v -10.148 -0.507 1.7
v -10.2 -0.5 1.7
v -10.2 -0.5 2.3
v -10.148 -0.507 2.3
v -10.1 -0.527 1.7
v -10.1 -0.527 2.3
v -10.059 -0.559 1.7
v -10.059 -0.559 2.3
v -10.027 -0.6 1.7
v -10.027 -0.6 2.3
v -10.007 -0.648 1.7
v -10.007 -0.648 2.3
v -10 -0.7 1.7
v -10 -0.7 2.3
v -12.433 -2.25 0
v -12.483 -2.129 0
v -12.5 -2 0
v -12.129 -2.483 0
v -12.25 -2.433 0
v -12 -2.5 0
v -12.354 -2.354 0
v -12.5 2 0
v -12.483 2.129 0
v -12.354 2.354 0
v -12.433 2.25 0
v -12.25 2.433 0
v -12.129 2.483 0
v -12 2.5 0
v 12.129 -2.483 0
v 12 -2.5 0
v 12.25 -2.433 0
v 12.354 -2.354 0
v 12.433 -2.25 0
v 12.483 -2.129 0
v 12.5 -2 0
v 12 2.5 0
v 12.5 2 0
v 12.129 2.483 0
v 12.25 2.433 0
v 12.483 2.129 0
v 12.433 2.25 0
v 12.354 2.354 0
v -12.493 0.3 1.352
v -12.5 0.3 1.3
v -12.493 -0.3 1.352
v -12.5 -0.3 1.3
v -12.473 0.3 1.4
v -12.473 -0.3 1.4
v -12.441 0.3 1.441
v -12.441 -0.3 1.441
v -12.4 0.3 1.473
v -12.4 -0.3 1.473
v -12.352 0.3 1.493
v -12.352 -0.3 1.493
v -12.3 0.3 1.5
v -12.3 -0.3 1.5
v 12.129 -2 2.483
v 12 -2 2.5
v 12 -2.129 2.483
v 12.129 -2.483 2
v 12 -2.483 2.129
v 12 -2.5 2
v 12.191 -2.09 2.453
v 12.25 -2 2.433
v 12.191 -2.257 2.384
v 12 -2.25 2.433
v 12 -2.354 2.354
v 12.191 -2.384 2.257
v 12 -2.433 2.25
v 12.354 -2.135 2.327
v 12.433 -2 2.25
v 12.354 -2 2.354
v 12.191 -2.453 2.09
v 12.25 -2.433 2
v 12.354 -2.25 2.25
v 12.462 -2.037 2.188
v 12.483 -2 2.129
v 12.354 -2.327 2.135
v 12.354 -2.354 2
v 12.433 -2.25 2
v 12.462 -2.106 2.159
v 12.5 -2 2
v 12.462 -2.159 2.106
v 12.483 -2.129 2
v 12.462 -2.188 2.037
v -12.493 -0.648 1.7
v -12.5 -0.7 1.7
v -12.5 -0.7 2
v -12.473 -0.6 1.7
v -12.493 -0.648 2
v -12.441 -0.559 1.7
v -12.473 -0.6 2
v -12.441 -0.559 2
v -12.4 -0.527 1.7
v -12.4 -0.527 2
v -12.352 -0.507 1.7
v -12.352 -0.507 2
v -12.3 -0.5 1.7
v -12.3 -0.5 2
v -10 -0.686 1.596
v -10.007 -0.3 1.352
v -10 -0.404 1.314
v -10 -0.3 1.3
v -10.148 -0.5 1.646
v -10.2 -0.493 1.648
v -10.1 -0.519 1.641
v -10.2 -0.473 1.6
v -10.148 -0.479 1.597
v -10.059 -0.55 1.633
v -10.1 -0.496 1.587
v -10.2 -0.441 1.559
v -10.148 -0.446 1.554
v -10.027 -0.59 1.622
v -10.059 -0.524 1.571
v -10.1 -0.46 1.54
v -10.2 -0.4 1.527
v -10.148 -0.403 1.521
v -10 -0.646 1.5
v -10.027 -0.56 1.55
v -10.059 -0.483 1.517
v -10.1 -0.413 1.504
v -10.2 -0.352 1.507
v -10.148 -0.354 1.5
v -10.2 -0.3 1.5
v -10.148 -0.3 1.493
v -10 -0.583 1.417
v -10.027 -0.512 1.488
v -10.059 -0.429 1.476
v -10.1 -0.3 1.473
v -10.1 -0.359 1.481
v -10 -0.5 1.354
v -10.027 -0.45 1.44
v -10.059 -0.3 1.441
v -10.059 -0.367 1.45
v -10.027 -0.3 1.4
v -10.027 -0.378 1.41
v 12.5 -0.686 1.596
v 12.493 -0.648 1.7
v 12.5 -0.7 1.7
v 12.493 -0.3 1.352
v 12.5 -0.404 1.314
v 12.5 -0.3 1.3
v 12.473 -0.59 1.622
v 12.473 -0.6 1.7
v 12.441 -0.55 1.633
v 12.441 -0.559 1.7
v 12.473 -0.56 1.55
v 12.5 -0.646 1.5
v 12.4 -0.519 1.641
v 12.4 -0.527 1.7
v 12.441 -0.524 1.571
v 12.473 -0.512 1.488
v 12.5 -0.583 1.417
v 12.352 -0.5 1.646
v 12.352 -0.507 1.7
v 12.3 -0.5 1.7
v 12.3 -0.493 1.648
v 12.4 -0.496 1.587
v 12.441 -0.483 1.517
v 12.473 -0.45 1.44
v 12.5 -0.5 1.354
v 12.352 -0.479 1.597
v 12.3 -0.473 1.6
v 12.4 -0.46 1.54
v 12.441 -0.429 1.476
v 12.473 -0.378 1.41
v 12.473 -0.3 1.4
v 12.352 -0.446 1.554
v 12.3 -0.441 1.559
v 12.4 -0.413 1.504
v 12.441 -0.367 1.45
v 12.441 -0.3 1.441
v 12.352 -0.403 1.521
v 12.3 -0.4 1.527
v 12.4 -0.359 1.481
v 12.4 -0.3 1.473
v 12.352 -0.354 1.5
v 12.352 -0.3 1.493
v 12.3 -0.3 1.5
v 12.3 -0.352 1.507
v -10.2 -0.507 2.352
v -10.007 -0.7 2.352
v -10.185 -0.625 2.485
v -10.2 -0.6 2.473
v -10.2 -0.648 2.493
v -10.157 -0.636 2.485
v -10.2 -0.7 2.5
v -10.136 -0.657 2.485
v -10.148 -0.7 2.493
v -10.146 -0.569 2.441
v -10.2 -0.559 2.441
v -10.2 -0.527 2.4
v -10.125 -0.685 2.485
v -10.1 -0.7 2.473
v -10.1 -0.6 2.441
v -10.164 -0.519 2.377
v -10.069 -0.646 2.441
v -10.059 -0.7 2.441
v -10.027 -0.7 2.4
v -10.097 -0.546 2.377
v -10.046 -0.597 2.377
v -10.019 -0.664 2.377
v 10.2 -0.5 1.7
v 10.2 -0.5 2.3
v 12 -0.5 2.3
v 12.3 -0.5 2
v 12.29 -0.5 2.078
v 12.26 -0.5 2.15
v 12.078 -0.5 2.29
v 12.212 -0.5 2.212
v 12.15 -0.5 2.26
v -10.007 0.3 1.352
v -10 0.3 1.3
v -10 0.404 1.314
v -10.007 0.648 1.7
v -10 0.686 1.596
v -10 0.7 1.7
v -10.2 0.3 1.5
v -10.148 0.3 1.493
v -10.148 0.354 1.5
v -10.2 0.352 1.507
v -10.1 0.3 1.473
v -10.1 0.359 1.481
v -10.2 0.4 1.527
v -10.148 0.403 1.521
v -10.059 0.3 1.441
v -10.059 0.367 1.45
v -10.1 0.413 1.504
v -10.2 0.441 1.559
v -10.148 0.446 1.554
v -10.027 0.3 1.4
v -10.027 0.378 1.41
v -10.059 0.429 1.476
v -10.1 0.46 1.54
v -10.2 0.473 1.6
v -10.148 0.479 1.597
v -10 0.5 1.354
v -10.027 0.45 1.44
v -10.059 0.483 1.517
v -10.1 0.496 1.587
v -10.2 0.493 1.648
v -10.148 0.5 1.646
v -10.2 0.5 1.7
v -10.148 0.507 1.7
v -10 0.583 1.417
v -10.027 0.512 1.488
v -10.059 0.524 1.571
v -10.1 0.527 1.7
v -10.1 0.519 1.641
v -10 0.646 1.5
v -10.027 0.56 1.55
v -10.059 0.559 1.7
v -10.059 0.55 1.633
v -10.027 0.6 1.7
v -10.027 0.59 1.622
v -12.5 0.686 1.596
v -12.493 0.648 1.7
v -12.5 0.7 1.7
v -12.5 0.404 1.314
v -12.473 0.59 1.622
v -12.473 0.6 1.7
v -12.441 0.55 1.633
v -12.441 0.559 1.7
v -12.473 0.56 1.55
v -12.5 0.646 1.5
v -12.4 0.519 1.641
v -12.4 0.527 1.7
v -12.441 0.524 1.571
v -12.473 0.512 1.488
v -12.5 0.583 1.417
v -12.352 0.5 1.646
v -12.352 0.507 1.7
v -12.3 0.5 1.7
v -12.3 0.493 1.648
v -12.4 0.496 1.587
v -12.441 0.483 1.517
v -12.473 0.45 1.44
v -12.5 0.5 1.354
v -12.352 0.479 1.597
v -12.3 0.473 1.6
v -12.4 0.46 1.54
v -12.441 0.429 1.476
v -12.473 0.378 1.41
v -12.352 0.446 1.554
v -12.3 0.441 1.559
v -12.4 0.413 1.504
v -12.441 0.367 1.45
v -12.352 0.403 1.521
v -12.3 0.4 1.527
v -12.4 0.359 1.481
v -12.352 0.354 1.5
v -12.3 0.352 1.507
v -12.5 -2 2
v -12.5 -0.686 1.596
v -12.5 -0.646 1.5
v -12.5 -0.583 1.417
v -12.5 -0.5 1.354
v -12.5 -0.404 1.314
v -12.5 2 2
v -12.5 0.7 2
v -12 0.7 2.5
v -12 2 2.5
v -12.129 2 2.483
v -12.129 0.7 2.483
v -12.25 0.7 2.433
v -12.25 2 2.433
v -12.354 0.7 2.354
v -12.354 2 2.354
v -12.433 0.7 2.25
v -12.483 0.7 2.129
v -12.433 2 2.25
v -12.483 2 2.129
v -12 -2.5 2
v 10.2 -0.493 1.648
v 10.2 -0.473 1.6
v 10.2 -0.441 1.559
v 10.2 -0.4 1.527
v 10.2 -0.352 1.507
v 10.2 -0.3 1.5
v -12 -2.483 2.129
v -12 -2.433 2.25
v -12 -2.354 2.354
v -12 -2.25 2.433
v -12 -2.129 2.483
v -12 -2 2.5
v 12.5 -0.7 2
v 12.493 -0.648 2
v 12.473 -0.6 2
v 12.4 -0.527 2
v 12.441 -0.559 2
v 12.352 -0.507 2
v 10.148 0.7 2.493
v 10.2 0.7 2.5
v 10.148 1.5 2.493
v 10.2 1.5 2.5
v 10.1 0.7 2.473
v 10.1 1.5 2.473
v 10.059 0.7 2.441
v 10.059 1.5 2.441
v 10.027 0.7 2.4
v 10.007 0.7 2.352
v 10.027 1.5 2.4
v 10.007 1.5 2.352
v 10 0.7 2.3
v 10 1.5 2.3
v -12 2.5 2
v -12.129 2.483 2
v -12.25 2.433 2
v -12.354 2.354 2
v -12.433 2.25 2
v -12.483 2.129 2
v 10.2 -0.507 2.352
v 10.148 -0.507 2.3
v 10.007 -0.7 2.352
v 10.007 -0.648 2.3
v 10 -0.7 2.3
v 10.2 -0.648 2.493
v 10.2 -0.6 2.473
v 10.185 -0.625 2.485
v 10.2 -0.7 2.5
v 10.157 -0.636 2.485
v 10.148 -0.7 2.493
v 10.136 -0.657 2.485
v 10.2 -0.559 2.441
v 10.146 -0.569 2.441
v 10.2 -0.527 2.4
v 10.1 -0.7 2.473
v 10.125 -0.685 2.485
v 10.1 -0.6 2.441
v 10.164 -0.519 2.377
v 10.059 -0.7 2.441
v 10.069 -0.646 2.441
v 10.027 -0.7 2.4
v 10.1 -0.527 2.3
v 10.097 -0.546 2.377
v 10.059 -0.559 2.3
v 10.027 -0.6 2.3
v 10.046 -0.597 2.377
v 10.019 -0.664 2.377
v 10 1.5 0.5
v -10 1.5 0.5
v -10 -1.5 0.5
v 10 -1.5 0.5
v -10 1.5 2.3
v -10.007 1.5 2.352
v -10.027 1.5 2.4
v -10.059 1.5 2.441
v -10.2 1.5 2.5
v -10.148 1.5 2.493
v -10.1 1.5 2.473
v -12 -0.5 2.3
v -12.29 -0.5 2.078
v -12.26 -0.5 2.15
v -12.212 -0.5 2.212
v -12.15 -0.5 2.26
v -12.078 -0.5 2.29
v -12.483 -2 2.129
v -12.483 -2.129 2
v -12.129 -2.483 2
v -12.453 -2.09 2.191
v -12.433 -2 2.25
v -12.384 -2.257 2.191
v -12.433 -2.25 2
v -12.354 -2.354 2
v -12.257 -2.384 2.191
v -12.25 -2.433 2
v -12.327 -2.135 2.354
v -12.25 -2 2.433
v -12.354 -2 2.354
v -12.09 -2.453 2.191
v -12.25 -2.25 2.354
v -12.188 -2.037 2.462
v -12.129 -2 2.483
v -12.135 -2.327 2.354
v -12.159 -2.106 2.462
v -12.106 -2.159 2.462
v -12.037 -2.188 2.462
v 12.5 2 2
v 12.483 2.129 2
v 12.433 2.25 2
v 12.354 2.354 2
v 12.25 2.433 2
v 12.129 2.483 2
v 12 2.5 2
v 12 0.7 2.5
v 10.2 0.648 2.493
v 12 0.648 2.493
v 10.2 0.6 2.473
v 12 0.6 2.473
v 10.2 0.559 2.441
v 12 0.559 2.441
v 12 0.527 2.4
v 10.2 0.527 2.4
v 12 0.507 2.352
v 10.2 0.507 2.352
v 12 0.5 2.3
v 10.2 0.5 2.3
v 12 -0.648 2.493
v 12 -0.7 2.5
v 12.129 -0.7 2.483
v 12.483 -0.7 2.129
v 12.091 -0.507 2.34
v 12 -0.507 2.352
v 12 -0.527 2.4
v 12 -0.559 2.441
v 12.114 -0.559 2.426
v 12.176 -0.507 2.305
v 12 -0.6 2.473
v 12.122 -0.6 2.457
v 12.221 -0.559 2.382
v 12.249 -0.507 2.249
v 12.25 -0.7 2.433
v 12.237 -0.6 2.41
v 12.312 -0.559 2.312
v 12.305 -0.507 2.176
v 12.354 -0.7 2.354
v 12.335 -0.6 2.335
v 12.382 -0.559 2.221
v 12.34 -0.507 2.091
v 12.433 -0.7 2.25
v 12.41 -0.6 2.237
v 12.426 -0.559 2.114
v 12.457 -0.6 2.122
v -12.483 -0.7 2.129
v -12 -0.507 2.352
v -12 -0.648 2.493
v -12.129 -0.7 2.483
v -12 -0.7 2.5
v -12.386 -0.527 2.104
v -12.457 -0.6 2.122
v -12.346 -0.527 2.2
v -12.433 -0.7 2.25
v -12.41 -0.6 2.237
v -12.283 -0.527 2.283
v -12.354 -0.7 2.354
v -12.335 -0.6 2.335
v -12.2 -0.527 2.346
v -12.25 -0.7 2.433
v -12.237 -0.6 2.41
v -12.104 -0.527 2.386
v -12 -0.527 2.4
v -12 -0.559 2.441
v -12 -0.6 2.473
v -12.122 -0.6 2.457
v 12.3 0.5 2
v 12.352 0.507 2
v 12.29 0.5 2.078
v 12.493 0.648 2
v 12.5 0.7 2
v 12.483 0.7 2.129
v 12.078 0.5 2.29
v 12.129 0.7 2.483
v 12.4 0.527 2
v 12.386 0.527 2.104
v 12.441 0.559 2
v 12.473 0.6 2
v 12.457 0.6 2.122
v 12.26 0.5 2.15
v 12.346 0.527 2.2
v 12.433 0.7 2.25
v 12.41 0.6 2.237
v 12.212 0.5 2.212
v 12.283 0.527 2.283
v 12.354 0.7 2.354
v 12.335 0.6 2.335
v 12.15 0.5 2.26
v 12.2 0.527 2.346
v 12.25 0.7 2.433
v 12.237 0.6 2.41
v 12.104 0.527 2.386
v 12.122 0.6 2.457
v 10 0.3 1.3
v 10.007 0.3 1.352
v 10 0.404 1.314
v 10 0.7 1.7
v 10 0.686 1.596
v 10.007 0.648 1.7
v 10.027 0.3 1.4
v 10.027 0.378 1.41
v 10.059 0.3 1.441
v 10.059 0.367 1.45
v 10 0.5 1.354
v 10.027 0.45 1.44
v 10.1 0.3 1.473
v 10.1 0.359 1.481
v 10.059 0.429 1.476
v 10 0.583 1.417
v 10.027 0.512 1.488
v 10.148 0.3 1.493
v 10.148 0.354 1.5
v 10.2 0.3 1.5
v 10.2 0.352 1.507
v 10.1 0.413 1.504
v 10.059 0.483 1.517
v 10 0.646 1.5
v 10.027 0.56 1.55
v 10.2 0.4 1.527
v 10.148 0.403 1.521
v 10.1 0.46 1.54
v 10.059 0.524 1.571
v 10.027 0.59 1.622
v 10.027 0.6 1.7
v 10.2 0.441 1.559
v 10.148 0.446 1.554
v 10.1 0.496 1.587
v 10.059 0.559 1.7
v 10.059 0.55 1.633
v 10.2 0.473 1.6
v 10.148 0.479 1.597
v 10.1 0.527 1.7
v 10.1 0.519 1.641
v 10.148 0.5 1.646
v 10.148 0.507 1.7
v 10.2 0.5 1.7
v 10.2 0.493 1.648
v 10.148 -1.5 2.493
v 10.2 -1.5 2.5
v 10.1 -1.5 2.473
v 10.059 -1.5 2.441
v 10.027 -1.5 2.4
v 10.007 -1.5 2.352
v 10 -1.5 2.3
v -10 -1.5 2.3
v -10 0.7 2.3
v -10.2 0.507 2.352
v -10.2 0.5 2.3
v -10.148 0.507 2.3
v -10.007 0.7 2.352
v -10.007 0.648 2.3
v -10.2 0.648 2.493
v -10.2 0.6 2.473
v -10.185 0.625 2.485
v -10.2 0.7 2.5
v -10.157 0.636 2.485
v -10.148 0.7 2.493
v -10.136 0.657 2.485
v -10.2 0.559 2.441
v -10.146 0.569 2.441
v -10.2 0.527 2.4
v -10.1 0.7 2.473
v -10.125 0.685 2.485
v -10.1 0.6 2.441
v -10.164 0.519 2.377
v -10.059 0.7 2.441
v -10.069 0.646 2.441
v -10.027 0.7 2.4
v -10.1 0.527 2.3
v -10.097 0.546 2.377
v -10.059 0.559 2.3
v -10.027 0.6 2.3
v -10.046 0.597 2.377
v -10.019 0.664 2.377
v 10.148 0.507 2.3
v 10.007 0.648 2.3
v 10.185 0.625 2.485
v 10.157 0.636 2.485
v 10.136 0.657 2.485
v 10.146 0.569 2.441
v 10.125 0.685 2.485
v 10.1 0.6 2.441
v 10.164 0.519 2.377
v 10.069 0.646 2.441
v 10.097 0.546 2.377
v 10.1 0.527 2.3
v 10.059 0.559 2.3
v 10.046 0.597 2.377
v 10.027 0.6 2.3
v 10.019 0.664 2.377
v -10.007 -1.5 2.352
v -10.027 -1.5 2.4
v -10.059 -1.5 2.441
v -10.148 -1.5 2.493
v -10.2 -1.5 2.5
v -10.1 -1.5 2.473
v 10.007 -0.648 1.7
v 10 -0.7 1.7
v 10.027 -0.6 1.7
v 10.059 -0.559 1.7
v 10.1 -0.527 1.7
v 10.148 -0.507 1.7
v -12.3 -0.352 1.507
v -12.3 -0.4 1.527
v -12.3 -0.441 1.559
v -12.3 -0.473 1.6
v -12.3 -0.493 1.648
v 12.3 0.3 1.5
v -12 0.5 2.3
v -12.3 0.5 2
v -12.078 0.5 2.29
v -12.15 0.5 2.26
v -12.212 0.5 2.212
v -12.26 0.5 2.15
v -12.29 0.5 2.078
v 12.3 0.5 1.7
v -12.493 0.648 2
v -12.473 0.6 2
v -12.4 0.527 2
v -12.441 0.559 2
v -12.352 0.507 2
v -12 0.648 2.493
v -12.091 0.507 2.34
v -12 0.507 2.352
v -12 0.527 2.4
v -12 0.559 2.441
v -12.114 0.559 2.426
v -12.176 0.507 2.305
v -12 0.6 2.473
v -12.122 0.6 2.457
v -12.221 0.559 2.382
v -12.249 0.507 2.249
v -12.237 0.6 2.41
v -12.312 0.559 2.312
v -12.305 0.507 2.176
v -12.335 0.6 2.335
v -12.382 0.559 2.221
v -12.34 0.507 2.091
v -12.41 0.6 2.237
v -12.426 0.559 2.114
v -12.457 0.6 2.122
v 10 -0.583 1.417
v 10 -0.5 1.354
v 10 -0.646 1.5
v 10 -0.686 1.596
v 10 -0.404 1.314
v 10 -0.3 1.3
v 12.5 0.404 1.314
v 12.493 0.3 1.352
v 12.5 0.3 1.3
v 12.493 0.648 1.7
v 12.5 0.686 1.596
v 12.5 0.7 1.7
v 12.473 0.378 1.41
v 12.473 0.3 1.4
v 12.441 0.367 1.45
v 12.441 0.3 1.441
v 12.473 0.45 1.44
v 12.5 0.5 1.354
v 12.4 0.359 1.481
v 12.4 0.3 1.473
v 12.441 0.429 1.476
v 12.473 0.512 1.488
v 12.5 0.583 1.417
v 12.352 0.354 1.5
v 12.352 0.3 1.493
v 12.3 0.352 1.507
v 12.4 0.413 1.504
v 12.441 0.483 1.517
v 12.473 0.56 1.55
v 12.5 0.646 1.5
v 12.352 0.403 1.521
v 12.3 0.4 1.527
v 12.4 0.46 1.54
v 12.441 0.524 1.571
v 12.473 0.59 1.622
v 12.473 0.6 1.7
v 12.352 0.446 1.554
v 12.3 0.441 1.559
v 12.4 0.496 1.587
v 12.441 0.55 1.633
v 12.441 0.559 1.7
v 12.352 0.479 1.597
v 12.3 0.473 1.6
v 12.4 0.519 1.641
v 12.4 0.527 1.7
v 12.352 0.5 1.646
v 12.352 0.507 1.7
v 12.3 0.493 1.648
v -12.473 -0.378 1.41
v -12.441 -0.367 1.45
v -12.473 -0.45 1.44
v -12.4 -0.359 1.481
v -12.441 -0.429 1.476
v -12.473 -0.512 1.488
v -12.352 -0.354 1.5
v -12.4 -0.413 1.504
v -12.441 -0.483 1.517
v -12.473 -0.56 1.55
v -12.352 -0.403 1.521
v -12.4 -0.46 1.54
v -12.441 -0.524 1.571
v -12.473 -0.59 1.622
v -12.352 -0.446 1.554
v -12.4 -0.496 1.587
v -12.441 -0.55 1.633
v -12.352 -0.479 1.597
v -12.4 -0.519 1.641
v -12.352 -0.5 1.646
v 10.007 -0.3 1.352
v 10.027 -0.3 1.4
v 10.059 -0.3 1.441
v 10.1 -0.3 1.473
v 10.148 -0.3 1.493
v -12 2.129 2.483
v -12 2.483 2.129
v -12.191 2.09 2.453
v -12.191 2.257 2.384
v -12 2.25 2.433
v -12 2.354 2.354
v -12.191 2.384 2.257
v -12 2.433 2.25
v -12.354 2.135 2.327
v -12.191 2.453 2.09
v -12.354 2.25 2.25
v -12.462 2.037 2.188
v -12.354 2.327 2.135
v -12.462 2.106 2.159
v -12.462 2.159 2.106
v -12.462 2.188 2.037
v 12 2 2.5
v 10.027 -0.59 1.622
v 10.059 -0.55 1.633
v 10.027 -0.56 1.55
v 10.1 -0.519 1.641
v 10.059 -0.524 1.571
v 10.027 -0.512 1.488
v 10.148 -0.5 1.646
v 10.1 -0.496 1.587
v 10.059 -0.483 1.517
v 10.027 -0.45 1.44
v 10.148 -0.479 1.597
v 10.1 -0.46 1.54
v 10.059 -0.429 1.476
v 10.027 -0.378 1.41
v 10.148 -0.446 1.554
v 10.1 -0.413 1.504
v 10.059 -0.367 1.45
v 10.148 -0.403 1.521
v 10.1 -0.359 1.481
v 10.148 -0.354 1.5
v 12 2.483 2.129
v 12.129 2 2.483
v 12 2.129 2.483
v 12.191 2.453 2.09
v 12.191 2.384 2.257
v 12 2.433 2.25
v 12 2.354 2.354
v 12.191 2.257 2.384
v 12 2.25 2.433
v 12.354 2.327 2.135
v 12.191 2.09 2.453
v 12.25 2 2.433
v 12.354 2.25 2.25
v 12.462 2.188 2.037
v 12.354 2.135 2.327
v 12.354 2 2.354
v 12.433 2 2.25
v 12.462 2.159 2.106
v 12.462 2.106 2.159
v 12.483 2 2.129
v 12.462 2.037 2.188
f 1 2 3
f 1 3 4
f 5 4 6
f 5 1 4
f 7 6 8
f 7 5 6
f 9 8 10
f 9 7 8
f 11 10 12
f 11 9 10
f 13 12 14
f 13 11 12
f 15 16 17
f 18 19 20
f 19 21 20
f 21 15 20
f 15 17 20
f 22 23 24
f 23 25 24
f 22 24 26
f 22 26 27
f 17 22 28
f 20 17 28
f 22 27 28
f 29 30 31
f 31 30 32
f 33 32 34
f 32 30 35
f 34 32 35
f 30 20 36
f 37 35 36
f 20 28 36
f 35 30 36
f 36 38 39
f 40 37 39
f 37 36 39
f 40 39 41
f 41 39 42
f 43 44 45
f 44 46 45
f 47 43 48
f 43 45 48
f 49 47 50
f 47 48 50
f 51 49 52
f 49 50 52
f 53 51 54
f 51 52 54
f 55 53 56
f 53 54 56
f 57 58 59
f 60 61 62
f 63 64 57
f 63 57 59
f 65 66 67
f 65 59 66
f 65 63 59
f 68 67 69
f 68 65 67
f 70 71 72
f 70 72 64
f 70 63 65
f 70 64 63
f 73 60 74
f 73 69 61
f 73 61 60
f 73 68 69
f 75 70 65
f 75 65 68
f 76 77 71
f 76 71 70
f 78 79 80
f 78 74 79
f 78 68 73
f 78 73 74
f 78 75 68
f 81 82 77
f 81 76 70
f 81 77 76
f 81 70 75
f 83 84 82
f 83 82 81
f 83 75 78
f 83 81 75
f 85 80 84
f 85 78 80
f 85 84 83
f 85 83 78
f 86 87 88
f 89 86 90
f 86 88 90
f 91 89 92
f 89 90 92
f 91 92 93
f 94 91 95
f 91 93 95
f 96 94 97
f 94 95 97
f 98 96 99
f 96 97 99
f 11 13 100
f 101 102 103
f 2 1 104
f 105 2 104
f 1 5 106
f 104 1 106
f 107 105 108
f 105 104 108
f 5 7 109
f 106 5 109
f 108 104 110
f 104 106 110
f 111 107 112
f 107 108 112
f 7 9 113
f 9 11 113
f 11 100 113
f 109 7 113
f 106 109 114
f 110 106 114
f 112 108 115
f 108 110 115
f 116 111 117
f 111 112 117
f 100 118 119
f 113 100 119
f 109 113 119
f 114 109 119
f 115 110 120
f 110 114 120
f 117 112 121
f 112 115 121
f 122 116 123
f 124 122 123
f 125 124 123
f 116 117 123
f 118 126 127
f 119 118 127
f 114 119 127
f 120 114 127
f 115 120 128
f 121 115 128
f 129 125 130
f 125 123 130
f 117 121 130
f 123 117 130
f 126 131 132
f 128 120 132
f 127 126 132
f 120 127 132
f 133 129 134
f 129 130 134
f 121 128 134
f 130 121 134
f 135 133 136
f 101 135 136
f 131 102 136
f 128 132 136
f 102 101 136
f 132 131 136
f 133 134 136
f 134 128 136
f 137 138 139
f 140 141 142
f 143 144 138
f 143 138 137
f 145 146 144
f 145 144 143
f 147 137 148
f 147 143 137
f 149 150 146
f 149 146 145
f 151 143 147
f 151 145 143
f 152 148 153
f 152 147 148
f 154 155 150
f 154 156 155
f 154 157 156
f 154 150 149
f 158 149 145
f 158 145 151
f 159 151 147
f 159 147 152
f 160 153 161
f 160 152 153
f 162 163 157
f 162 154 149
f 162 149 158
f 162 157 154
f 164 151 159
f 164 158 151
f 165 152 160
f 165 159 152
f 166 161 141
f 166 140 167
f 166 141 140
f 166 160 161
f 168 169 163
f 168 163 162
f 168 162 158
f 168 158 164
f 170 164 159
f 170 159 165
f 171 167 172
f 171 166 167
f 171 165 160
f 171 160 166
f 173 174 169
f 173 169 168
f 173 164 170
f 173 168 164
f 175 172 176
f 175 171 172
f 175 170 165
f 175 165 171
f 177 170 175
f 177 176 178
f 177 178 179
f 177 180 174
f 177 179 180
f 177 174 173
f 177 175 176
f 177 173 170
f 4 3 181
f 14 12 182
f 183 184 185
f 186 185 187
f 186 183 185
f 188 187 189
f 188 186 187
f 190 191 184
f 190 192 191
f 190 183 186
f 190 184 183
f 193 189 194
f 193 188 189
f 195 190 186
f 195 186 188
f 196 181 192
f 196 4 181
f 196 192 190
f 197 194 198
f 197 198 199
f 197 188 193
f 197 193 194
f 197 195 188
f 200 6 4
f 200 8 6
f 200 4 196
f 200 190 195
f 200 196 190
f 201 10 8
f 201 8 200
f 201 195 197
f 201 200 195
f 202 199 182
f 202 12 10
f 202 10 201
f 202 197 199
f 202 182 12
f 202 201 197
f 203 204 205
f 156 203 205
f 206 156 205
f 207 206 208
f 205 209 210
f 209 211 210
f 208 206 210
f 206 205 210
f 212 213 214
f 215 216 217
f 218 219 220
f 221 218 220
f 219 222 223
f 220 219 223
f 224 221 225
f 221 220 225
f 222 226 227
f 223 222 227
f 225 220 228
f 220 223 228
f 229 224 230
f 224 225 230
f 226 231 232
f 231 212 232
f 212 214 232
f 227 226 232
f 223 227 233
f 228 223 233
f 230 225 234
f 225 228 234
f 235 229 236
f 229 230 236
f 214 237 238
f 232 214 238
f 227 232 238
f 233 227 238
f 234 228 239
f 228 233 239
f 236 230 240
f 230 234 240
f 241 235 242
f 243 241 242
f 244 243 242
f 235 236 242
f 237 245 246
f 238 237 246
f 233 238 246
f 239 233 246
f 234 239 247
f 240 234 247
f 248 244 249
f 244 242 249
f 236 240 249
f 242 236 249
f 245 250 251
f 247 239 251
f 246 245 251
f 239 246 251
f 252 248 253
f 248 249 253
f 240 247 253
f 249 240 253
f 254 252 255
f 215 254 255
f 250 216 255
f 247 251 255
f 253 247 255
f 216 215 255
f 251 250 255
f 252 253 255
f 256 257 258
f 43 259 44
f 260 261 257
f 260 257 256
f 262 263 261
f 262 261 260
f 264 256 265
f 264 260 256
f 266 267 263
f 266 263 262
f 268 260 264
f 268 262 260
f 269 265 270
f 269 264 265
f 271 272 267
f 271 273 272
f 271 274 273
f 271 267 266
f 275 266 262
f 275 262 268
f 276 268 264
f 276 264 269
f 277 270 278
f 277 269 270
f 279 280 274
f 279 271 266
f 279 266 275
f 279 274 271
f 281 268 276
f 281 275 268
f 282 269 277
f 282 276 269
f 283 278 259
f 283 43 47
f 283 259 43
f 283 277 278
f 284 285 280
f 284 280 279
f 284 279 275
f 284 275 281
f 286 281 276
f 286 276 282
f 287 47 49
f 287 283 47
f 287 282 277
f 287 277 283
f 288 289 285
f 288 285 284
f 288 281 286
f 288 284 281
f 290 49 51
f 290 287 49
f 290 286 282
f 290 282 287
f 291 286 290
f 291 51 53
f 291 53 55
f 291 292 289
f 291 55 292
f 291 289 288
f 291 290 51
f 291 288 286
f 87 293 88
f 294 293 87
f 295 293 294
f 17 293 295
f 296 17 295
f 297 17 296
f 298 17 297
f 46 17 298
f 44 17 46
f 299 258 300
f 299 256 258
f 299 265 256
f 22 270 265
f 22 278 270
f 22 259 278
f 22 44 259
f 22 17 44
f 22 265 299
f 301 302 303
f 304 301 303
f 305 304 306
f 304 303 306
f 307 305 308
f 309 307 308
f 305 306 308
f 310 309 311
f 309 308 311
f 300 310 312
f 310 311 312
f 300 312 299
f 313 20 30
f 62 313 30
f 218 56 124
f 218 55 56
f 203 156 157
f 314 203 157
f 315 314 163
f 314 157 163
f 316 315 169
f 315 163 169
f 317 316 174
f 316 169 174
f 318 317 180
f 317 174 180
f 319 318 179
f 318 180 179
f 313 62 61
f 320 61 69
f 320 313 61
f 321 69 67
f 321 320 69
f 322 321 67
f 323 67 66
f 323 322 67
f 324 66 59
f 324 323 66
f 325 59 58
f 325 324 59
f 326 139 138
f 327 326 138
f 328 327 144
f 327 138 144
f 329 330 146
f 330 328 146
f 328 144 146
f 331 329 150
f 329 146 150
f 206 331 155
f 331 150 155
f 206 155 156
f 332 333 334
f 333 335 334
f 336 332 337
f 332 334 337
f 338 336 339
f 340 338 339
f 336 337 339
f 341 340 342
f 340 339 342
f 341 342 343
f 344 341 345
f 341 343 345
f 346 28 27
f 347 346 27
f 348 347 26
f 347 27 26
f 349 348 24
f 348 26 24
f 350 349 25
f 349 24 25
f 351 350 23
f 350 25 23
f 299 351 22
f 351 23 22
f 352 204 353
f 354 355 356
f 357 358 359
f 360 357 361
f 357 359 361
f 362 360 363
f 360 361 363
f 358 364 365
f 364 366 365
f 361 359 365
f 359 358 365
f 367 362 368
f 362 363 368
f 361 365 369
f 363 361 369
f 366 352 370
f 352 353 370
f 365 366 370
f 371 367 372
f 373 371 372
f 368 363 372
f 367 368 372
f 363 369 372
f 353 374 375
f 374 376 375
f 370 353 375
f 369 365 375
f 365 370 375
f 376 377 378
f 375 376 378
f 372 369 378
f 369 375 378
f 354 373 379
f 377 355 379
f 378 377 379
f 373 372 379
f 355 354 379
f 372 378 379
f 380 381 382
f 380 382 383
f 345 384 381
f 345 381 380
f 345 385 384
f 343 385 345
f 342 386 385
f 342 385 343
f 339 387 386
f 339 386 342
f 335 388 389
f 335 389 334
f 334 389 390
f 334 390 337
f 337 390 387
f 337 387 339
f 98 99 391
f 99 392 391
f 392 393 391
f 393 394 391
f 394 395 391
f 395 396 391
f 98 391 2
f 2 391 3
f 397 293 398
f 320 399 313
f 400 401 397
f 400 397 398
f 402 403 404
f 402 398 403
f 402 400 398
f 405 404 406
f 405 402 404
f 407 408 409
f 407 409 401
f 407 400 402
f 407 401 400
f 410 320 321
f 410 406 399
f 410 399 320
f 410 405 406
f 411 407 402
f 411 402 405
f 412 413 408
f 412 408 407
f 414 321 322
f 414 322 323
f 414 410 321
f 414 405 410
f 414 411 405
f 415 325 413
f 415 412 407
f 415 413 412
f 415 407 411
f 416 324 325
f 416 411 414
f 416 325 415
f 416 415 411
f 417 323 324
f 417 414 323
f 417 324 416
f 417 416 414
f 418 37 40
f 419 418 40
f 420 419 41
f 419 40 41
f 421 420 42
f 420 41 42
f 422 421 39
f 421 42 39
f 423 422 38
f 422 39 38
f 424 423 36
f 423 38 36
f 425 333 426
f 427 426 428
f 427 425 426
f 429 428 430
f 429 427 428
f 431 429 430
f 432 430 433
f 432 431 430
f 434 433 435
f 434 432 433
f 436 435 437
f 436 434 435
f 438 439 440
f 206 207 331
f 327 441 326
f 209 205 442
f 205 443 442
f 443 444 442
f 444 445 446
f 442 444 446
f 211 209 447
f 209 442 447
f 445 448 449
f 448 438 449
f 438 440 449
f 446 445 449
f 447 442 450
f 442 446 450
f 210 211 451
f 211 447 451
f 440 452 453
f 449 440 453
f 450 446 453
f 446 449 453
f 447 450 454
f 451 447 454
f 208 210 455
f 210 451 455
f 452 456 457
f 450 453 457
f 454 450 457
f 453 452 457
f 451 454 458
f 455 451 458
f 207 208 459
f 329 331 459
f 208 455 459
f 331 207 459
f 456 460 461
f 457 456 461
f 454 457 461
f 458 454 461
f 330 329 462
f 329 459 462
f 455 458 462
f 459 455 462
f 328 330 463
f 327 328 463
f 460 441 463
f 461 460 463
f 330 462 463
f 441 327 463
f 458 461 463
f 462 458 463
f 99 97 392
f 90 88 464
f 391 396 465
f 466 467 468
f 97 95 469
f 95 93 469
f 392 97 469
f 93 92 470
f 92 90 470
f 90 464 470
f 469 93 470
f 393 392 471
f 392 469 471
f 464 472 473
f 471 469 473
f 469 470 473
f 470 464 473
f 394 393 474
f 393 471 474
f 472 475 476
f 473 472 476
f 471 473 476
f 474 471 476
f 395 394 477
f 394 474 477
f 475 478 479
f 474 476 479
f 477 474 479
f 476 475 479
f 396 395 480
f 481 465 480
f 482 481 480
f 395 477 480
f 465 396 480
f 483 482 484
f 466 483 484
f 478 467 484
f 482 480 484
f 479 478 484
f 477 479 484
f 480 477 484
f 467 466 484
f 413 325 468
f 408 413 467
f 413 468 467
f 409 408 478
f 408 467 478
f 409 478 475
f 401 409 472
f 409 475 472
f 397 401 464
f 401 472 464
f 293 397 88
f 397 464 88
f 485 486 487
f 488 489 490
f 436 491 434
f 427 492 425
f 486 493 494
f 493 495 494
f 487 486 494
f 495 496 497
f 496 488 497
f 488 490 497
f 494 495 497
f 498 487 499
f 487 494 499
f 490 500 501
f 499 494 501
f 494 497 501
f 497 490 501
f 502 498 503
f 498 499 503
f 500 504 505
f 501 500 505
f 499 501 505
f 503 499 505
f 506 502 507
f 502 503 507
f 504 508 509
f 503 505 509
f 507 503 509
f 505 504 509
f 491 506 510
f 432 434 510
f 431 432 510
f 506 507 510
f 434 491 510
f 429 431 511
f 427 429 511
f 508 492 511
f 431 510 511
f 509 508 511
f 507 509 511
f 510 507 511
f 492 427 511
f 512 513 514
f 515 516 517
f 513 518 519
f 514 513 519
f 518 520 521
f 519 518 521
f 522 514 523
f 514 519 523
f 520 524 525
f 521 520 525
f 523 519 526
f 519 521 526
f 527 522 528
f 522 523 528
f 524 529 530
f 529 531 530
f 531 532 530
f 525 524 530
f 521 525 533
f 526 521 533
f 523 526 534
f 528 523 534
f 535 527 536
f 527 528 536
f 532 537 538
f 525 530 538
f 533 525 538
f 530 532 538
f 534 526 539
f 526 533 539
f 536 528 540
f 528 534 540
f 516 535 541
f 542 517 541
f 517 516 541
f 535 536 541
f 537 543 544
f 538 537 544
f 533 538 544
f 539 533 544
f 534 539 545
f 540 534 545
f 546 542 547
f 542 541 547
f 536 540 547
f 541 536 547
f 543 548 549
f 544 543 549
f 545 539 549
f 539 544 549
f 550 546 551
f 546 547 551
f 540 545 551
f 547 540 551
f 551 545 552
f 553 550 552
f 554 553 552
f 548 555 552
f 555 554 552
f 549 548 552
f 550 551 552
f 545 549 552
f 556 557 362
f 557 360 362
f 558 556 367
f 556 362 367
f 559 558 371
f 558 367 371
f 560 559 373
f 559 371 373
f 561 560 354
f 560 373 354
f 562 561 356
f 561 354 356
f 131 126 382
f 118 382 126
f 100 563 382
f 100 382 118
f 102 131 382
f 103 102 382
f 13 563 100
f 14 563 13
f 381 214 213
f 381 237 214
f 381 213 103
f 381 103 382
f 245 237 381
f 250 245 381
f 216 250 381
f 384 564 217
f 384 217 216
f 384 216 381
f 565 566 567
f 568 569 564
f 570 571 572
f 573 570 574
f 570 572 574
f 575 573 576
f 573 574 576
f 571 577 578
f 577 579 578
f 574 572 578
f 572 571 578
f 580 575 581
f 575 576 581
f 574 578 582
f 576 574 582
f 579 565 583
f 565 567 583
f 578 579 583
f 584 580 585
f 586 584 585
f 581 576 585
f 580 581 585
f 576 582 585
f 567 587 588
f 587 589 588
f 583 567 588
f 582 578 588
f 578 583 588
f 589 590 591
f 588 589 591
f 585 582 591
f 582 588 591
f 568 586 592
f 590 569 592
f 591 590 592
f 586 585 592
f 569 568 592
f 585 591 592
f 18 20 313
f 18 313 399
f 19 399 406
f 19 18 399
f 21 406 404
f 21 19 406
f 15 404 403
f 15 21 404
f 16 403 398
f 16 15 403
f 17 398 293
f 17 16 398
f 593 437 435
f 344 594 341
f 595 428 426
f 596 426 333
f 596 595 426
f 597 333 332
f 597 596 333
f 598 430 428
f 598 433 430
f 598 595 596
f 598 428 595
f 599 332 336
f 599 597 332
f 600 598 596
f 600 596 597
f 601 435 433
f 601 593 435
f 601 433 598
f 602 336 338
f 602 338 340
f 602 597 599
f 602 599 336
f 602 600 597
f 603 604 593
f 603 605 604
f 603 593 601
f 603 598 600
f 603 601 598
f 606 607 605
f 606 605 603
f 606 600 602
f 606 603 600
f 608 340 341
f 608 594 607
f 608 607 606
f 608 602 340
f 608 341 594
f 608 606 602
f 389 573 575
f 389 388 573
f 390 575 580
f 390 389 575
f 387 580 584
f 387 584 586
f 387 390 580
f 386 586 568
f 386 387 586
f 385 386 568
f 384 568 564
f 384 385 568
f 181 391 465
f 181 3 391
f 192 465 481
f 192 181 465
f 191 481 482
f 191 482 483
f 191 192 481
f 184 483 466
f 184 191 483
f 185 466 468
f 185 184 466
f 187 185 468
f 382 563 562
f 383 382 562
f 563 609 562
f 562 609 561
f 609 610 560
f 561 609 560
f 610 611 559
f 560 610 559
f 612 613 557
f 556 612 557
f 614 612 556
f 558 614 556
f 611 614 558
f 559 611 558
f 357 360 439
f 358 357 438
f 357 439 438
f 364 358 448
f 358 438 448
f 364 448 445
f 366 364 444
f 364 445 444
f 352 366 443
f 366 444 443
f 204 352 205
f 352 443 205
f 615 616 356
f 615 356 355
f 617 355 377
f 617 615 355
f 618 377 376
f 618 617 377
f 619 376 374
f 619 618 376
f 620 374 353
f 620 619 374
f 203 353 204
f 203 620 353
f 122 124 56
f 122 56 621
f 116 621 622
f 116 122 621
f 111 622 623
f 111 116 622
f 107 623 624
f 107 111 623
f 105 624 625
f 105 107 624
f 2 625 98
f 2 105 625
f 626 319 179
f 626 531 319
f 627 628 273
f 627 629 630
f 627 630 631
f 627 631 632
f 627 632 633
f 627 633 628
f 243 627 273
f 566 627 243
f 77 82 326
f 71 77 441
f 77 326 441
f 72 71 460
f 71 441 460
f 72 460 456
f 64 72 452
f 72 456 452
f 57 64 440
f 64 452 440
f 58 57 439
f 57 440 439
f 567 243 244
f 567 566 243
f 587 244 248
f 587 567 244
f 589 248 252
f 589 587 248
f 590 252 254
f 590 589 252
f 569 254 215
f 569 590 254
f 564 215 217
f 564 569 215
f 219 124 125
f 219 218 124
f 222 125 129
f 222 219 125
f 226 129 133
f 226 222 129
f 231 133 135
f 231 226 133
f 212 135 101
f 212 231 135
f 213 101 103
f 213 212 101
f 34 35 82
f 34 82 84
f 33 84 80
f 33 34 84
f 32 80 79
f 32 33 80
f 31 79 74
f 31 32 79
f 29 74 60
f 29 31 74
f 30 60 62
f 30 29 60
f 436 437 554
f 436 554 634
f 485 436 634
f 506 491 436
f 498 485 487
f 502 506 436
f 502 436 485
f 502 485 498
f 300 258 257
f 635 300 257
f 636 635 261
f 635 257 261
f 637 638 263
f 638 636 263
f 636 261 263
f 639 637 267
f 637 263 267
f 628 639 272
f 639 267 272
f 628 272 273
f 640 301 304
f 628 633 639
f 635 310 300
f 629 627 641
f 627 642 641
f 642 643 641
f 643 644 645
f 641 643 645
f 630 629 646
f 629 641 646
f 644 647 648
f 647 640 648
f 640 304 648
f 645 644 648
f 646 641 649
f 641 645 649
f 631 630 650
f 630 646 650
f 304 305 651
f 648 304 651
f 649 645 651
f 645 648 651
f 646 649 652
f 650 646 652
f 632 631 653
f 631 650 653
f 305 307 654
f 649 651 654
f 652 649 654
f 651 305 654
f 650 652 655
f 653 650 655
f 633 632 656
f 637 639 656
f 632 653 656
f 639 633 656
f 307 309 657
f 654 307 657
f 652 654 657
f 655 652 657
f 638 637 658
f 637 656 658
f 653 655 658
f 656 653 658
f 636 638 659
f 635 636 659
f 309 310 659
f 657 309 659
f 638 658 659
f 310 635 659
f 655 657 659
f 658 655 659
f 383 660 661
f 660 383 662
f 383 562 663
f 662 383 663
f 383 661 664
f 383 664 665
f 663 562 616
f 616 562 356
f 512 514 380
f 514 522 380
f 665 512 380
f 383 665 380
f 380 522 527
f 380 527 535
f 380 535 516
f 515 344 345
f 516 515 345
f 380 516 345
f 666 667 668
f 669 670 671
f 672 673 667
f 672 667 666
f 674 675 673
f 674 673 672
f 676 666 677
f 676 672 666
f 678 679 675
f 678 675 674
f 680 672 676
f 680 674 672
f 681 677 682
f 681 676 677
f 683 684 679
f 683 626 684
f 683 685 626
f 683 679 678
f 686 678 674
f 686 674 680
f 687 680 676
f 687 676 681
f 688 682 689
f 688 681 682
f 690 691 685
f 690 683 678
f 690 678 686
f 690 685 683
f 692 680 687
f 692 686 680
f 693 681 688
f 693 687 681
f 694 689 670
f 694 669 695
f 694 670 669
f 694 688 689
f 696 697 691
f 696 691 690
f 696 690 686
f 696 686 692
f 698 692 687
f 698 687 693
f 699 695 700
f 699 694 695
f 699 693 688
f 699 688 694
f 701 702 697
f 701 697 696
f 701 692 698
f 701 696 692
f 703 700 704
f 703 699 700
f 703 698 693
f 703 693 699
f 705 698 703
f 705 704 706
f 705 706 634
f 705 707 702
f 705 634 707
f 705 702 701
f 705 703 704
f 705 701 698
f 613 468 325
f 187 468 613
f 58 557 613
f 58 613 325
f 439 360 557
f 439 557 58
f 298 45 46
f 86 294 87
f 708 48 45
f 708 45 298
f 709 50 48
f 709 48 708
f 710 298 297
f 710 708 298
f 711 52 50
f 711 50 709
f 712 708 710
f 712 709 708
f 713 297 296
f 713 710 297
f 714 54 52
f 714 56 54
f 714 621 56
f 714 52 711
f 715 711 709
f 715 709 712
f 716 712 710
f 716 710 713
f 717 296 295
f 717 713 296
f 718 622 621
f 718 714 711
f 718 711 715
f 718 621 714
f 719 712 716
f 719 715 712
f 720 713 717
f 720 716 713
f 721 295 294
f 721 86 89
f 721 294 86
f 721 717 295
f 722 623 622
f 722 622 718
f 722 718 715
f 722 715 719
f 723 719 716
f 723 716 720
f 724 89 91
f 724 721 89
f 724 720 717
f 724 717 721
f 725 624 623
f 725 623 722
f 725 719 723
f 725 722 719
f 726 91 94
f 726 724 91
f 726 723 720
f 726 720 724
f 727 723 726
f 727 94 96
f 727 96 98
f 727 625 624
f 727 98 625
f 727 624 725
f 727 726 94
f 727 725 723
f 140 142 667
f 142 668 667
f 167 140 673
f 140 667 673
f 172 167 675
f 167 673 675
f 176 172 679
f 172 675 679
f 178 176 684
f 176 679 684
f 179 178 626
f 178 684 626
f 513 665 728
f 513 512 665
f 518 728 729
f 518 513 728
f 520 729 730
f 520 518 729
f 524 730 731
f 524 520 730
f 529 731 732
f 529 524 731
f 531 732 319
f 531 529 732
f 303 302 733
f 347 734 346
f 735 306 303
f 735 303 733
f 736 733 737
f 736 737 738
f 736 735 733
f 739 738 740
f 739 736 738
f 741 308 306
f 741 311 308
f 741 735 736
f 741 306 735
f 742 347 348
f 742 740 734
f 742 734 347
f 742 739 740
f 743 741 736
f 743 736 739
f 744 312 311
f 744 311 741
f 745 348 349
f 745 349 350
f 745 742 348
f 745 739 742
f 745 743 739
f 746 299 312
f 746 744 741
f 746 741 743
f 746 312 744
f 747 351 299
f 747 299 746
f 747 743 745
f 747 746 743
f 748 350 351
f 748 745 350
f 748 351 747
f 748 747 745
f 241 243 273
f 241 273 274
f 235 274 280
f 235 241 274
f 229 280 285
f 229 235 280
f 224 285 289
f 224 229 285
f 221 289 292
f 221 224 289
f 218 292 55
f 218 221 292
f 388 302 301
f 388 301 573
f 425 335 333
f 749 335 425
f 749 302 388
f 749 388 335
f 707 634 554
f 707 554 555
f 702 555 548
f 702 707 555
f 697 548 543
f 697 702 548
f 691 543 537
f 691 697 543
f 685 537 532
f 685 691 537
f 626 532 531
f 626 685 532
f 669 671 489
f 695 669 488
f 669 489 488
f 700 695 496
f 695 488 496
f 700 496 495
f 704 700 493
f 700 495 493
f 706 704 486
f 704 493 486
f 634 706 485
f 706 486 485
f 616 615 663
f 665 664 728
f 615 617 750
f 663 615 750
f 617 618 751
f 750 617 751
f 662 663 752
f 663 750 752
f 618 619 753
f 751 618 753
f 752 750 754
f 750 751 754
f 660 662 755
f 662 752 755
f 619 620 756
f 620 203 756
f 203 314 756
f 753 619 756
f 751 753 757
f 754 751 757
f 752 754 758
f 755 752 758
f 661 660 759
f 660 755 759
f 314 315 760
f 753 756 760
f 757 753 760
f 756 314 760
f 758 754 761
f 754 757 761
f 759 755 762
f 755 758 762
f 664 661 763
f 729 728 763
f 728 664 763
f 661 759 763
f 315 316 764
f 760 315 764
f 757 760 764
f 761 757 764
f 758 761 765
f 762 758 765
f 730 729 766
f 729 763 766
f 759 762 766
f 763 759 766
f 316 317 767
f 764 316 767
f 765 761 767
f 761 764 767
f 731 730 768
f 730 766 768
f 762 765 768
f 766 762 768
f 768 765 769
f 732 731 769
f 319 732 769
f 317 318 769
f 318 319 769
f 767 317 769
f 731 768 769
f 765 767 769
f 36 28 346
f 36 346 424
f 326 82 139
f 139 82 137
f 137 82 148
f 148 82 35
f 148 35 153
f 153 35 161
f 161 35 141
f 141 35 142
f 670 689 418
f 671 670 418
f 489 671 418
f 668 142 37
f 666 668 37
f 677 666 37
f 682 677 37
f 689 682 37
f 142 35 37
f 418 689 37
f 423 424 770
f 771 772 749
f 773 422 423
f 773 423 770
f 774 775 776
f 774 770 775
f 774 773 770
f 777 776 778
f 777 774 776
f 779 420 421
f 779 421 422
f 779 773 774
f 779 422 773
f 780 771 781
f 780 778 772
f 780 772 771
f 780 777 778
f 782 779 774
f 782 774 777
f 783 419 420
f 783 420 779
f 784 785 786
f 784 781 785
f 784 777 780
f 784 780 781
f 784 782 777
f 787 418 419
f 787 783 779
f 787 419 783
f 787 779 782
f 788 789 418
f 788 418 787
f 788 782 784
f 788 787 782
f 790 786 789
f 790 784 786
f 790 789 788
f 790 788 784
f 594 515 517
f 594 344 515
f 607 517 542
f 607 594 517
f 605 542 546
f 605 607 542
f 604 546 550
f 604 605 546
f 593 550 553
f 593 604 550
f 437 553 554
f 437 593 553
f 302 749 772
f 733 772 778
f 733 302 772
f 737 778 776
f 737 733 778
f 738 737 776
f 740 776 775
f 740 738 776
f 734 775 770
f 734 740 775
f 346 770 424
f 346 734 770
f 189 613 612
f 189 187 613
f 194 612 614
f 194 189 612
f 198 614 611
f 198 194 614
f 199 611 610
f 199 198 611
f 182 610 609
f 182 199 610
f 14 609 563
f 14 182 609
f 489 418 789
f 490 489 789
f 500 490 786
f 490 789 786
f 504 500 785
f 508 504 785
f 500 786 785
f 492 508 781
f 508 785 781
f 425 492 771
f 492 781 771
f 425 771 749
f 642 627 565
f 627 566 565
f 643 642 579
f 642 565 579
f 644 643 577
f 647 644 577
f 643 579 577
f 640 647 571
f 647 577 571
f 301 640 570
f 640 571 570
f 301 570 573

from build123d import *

# Parameters (mm, degrees)
F0_W         = 25
F0_H         = 5
F1_DEPTH     = 2.5
F2_W         = 20
F2_H         = 3
F3_DEPTH     = 2
F4_W         = 2.5
F4_H         = 1
F5_DEPTH     = 1
F6_F1_R      = 0.2
F6_F2_R      = 0.2
F7_T1_DEPTH  = 24
F7_T3_DEPTH  = 1.5
F7_T5_DEPTH  = 3.25
F7_T7_DEPTH  = 1.5
F7_T10_ANGLE = 90
F7_T12_ANGLE = 90
F7_T14_ANGLE = 90
F7_T16_ANGLE = 90
F7_S19_W     = 0.5
F7_S19_H     = 0.5
F7_T20_DEPTH = 0.5
F7_S25_W     = 0.5
F7_S25_H     = 0.5
F7_T26_DEPTH = 0.5
F7_S31_W     = 0.5
F7_S31_H     = 0.5
F7_T32_DEPTH = 0.5
F7_S37_W     = 0.5
F7_S37_H     = 0.5
F7_T38_DEPTH = 0.5


# Not quite as in the source:
# - a fillet or chamfer that OpenCascade refuses, or shapes differently, is made with other operations: its cross-section is extruded or revolved along the edge and cut away or added


with BuildPart() as f1:
    # F0 (on Top) → F1 (new body)
    with BuildSketch(Plane.XY):
        Rectangle(F0_W, F0_H)
    extrude(amount=F1_DEPTH)

    # F2 (on face) → F3 (cut)
    with BuildSketch(Plane.XY.offset(2.5)):
        Rectangle(F2_W, F2_H)
    extrude(amount=-F3_DEPTH, mode=Mode.SUBTRACT)

    # F4 (on face) → F5 (cut)
    with BuildSketch(Plane.XY.offset(2.5)):
        with Locations((-11.25, 0)):
            Rectangle(F4_W, F4_H)
        with Locations((11.25, 0)):
            Rectangle(F4_W, F4_H)
    extrude(amount=-F5_DEPTH, mode=Mode.SUBTRACT)

    # F6: fillet of radius 0.2 on 16 edges, made by hand

    # F6_f1
    f6_f1_edges = [f1.edges().sort_by_distance(p)[0] for p in [
        (-11.25, -0.5, 1.5),
        (-11.25, 0.5, 1.5),
        (11.25, -0.5, 1.5),
        (11.25, 0.5, 1.5),
    ]]
    fillet(f6_f1_edges, radius=F6_F1_R)

    # F6_f2
    f6_f2_edges = [f1.edges().sort_by_distance(p)[0] for p in [
        (-10, -0.5, 2.1),
        (10, 0, 1.5),
        (12.5, -0.5, 2.1),
        (-12.5, 0.5, 2.1),
        (-11.25, 0.5, 2.5),
        (-11.25, -0.5, 2.5),
        (11.25, 0.5, 2.5),
        (11.25, -0.5, 2.5),
        (-10, 1, 2.5),
        (10, 1, 2.5),
        (10, -1, 2.5),
        (-10, -1, 2.5),
        (-12.5, 0.4414213562, 1.5585786438),
        (12.5, -0.4414213562, 1.5585786438),
        (10, 0.4414213562, 1.5585786438),
        (10, -0.4414213562, 1.5585786438),
        (-10, -0.4414213562, 1.5585786438),
    ]]
    fillet(f6_f2_edges, radius=F6_F2_R)

    # F7: fillet of radius 0.5 on 10 edges, made by hand

    # F7_s2 → F7_t1 (cut)
    with BuildSketch(Plane.YZ.offset(-12)):
        with BuildLine():
            ThreePointArc((-2.5, 2), (-2.3535533906, 2.3535533906), (-2, 2.5))
            Line((-2, 2.5), (-2.5, 2.5))
            Line((-2.5, 2.5), (-2.5, 2))
        make_face()
        with BuildLine():
            ThreePointArc((2, 2.5), (2.3535533906, 2.3535533906), (2.5, 2))
            Line((2.5, 2), (2.5, 2.5))
            Line((2.5, 2.5), (2, 2.5))
        make_face()
    extrude(amount=F7_T1_DEPTH, mode=Mode.SUBTRACT)

    # F7_s4 → F7_t3 (cut)
    with BuildSketch(Plane.XZ.offset(0.5)):
        with BuildLine():
            ThreePointArc((-12, 2.5), (-12.3535533906, 2.3535533906), (-12.5, 2))
            Line((-12.5, 2), (-12.5, 2.5))
            Line((-12.5, 2.5), (-12, 2.5))
        make_face()
        with BuildLine():
            ThreePointArc((12.5, 2), (12.3535533906, 2.3535533906), (12, 2.5))
            Line((12, 2.5), (12.5, 2.5))
            Line((12.5, 2.5), (12.5, 2))
        make_face()
    extrude(amount=F7_T3_DEPTH, mode=Mode.SUBTRACT)

    # F7_s6 → F7_t5 (cut)
    with BuildSketch(Plane.XY.offset(-1.25)):
        with BuildLine():
            ThreePointArc((-12, -2.5), (-12.3535533906, -2.3535533906), (-12.5, -2))
            Line((-12.5, -2), (-12.5, -2.5))
            Line((-12.5, -2.5), (-12, -2.5))
        make_face()
        with BuildLine():
            ThreePointArc((12.5, -2), (12.3535533906, -2.3535533906), (12, -2.5))
            Line((12, -2.5), (12.5, -2.5))
            Line((12.5, -2.5), (12.5, -2))
        make_face()
        with BuildLine():
            ThreePointArc((-12, 2.5), (-12.3535533906, 2.3535533906), (-12.5, 2))
            Line((-12.5, 2), (-12.5, 2.5))
            Line((-12.5, 2.5), (-12, 2.5))
        make_face()
        with BuildLine():
            ThreePointArc((12.5, 2), (12.3535533906, 2.3535533906), (12, 2.5))
            Line((12, 2.5), (12.5, 2.5))
            Line((12.5, 2.5), (12.5, 2))
        make_face()
    extrude(amount=F7_T5_DEPTH, mode=Mode.SUBTRACT)

    # F7_s8 → F7_t7 (cut)
    with BuildSketch(Plane.XZ.offset(-2)):
        with BuildLine():
            ThreePointArc((-12, 2.5), (-12.3535533906, 2.3535533906), (-12.5, 2))
            Line((-12.5, 2), (-12.5, 2.5))
            Line((-12.5, 2.5), (-12, 2.5))
        make_face()
        with BuildLine():
            ThreePointArc((12.5, 2), (12.3535533906, 2.3535533906), (12, 2.5))
            Line((12, 2.5), (12.5, 2.5))
            Line((12.5, 2.5), (12.5, 2))
        make_face()
    extrude(amount=F7_T7_DEPTH, mode=Mode.SUBTRACT)

    # F7_s9 → F7_t10 (revolve, cut)
    with BuildSketch(Plane.XY.offset(2)):
        with BuildLine():
            ThreePointArc((12.3, 0.5), (12.4414213562, 0.5585786438), (12.5, 0.7))
            Line((12.5, 0.7), (12.5, 0.5))
            Line((12.5, 0.5), (12.3, 0.5))
        make_face()
    revolve(axis=Axis((12, 0.5, 2), (0, -1, 0)), revolution_arc=F7_T10_ANGLE, mode=Mode.SUBTRACT)

    # F7_s11 → F7_t12 (revolve, cut)
    with BuildSketch(Plane.YZ.offset(-12)):
        with BuildLine():
            ThreePointArc((0.5, 2.3), (0.5585786438, 2.4414213562), (0.7, 2.5))
            Line((0.7, 2.5), (0.5, 2.5))
            Line((0.5, 2.5), (0.5, 2.3))
        make_face()
    revolve(axis=Axis((-12, 0.5, 2), (0, -1, 0)), revolution_arc=F7_T12_ANGLE, mode=Mode.SUBTRACT)

    # F7_s13 → F7_t14 (revolve, cut)
    with BuildSketch(Plane.YZ.offset(12)):
        with BuildLine():
            ThreePointArc((-0.5, 2.3), (-0.5585786438, 2.4414213562), (-0.7, 2.5))
            Line((-0.7, 2.5), (-0.5, 2.5))
            Line((-0.5, 2.5), (-0.5, 2.3))
        make_face()
    revolve(axis=Axis((12, -0.5, 2), (0, 1, 0)), revolution_arc=F7_T14_ANGLE, mode=Mode.SUBTRACT)

    # F7_s15 → F7_t16 (revolve, cut)
    with BuildSketch(Plane.XY.offset(2)):
        with BuildLine():
            ThreePointArc((-12.3, -0.5), (-12.4414213562, -0.5585786438), (-12.5, -0.7))
            Line((-12.5, -0.7), (-12.5, -0.5))
            Line((-12.5, -0.5), (-12.3, -0.5))
        make_face()
    revolve(axis=Axis((-12, -0.5, 2), (0, 1, 0)), revolution_arc=F7_T16_ANGLE, mode=Mode.SUBTRACT)


with BuildPart() as f7_tool18:
    # F7_s19 → F7_t20 (new body)
    with BuildSketch(Plane.XY.offset(2)):
        with Locations((-12.25, -2.25)):
            Rectangle(F7_S19_W, F7_S19_H)
    extrude(amount=F7_T20_DEPTH)

    # F7_s21 → F7_t22 (revolve, cut)
    with BuildSketch(Plane(origin=(-12, -2, 2), x_dir=(0.7071067812, 0.7071067812, 0), z_dir=(0.7071067812, -0.7071067812, 0))):
        with BuildLine():
            ThreePointArc((0, -0.5), (0.5, 0), (0, 0.5))
            Line((0, 0.5), (0, -0.5))
        make_face()
    revolve(axis=Axis((-12, -2, 2), (0, 0, 1)), mode=Mode.SUBTRACT)


with BuildPart() as f1_1:
    add(f1.part)

    # F7_t17: cut F7_tool18
    add(f7_tool18.part, mode=Mode.SUBTRACT)


with BuildPart() as f7_tool24:
    # F7_s25 → F7_t26 (new body)
    with BuildSketch(Plane.YZ.offset(12)):
        with Locations((-2.25, 2.25)):
            Rectangle(F7_S25_W, F7_S25_H)
    extrude(amount=F7_T26_DEPTH)

    # F7_s27 → F7_t28 (revolve, cut)
    with BuildSketch(Plane(origin=(12, -2, 2), x_dir=(0, 0.7071067812, -0.7071067812), z_dir=(0, -0.7071067812, -0.7071067812))):
        with BuildLine():
            ThreePointArc((0, -0.5), (0.5, 0), (0, 0.5))
            Line((0, 0.5), (0, -0.5))
        make_face()
    revolve(axis=Axis((12, -2, 2), (1, 0, 0)), mode=Mode.SUBTRACT)


with BuildPart() as f1_2:
    add(f1_1.part)

    # F7_t23: cut F7_tool24
    add(f7_tool24.part, mode=Mode.SUBTRACT)


with BuildPart() as f7_tool30:
    # F7_s31 → F7_t32 (new body)
    with BuildSketch(Plane.YZ.offset(12)):
        with Locations((2.25, 2.25)):
            Rectangle(F7_S31_W, F7_S31_H)
    extrude(amount=F7_T32_DEPTH)

    # F7_s33 → F7_t34 (revolve, cut)
    with BuildSketch(Plane(origin=(12, 2, 2), x_dir=(0, -0.7071067812, -0.7071067812), z_dir=(0, -0.7071067812, 0.7071067812))):
        with BuildLine():
            ThreePointArc((0, -0.5), (0.5, 0), (0, 0.5))
            Line((0, 0.5), (0, -0.5))
        make_face()
    revolve(axis=Axis((12, 2, 2), (1, 0, 0)), mode=Mode.SUBTRACT)


with BuildPart() as f1_3:
    add(f1_2.part)

    # F7_t29: cut F7_tool30
    add(f7_tool30.part, mode=Mode.SUBTRACT)


with BuildPart() as f7_tool36:
    # F7_s37 → F7_t38 (new body)
    with BuildSketch(Plane.YZ.offset(-12)):
        with Locations((2.25, 2.25)):
            Rectangle(F7_S37_W, F7_S37_H)
    extrude(amount=-F7_T38_DEPTH)

    # F7_s39 → F7_t40 (revolve, cut)
    with BuildSketch(Plane(origin=(-12, 2, 2), x_dir=(0, -0.7071067812, -0.7071067812), z_dir=(0, 0.7071067812, -0.7071067812))):
        with BuildLine():
            ThreePointArc((0, -0.5), (0.5, 0), (0, 0.5))
            Line((0, 0.5), (0, -0.5))
        make_face()
    revolve(axis=Axis((-12, 2, 2), (-1, 0, 0)), mode=Mode.SUBTRACT)


with BuildPart() as f1_4:
    add(f1_3.part)

    # F7_t35: cut F7_tool36
    add(f7_tool36.part, mode=Mode.SUBTRACT)


solid = f1_4.part
